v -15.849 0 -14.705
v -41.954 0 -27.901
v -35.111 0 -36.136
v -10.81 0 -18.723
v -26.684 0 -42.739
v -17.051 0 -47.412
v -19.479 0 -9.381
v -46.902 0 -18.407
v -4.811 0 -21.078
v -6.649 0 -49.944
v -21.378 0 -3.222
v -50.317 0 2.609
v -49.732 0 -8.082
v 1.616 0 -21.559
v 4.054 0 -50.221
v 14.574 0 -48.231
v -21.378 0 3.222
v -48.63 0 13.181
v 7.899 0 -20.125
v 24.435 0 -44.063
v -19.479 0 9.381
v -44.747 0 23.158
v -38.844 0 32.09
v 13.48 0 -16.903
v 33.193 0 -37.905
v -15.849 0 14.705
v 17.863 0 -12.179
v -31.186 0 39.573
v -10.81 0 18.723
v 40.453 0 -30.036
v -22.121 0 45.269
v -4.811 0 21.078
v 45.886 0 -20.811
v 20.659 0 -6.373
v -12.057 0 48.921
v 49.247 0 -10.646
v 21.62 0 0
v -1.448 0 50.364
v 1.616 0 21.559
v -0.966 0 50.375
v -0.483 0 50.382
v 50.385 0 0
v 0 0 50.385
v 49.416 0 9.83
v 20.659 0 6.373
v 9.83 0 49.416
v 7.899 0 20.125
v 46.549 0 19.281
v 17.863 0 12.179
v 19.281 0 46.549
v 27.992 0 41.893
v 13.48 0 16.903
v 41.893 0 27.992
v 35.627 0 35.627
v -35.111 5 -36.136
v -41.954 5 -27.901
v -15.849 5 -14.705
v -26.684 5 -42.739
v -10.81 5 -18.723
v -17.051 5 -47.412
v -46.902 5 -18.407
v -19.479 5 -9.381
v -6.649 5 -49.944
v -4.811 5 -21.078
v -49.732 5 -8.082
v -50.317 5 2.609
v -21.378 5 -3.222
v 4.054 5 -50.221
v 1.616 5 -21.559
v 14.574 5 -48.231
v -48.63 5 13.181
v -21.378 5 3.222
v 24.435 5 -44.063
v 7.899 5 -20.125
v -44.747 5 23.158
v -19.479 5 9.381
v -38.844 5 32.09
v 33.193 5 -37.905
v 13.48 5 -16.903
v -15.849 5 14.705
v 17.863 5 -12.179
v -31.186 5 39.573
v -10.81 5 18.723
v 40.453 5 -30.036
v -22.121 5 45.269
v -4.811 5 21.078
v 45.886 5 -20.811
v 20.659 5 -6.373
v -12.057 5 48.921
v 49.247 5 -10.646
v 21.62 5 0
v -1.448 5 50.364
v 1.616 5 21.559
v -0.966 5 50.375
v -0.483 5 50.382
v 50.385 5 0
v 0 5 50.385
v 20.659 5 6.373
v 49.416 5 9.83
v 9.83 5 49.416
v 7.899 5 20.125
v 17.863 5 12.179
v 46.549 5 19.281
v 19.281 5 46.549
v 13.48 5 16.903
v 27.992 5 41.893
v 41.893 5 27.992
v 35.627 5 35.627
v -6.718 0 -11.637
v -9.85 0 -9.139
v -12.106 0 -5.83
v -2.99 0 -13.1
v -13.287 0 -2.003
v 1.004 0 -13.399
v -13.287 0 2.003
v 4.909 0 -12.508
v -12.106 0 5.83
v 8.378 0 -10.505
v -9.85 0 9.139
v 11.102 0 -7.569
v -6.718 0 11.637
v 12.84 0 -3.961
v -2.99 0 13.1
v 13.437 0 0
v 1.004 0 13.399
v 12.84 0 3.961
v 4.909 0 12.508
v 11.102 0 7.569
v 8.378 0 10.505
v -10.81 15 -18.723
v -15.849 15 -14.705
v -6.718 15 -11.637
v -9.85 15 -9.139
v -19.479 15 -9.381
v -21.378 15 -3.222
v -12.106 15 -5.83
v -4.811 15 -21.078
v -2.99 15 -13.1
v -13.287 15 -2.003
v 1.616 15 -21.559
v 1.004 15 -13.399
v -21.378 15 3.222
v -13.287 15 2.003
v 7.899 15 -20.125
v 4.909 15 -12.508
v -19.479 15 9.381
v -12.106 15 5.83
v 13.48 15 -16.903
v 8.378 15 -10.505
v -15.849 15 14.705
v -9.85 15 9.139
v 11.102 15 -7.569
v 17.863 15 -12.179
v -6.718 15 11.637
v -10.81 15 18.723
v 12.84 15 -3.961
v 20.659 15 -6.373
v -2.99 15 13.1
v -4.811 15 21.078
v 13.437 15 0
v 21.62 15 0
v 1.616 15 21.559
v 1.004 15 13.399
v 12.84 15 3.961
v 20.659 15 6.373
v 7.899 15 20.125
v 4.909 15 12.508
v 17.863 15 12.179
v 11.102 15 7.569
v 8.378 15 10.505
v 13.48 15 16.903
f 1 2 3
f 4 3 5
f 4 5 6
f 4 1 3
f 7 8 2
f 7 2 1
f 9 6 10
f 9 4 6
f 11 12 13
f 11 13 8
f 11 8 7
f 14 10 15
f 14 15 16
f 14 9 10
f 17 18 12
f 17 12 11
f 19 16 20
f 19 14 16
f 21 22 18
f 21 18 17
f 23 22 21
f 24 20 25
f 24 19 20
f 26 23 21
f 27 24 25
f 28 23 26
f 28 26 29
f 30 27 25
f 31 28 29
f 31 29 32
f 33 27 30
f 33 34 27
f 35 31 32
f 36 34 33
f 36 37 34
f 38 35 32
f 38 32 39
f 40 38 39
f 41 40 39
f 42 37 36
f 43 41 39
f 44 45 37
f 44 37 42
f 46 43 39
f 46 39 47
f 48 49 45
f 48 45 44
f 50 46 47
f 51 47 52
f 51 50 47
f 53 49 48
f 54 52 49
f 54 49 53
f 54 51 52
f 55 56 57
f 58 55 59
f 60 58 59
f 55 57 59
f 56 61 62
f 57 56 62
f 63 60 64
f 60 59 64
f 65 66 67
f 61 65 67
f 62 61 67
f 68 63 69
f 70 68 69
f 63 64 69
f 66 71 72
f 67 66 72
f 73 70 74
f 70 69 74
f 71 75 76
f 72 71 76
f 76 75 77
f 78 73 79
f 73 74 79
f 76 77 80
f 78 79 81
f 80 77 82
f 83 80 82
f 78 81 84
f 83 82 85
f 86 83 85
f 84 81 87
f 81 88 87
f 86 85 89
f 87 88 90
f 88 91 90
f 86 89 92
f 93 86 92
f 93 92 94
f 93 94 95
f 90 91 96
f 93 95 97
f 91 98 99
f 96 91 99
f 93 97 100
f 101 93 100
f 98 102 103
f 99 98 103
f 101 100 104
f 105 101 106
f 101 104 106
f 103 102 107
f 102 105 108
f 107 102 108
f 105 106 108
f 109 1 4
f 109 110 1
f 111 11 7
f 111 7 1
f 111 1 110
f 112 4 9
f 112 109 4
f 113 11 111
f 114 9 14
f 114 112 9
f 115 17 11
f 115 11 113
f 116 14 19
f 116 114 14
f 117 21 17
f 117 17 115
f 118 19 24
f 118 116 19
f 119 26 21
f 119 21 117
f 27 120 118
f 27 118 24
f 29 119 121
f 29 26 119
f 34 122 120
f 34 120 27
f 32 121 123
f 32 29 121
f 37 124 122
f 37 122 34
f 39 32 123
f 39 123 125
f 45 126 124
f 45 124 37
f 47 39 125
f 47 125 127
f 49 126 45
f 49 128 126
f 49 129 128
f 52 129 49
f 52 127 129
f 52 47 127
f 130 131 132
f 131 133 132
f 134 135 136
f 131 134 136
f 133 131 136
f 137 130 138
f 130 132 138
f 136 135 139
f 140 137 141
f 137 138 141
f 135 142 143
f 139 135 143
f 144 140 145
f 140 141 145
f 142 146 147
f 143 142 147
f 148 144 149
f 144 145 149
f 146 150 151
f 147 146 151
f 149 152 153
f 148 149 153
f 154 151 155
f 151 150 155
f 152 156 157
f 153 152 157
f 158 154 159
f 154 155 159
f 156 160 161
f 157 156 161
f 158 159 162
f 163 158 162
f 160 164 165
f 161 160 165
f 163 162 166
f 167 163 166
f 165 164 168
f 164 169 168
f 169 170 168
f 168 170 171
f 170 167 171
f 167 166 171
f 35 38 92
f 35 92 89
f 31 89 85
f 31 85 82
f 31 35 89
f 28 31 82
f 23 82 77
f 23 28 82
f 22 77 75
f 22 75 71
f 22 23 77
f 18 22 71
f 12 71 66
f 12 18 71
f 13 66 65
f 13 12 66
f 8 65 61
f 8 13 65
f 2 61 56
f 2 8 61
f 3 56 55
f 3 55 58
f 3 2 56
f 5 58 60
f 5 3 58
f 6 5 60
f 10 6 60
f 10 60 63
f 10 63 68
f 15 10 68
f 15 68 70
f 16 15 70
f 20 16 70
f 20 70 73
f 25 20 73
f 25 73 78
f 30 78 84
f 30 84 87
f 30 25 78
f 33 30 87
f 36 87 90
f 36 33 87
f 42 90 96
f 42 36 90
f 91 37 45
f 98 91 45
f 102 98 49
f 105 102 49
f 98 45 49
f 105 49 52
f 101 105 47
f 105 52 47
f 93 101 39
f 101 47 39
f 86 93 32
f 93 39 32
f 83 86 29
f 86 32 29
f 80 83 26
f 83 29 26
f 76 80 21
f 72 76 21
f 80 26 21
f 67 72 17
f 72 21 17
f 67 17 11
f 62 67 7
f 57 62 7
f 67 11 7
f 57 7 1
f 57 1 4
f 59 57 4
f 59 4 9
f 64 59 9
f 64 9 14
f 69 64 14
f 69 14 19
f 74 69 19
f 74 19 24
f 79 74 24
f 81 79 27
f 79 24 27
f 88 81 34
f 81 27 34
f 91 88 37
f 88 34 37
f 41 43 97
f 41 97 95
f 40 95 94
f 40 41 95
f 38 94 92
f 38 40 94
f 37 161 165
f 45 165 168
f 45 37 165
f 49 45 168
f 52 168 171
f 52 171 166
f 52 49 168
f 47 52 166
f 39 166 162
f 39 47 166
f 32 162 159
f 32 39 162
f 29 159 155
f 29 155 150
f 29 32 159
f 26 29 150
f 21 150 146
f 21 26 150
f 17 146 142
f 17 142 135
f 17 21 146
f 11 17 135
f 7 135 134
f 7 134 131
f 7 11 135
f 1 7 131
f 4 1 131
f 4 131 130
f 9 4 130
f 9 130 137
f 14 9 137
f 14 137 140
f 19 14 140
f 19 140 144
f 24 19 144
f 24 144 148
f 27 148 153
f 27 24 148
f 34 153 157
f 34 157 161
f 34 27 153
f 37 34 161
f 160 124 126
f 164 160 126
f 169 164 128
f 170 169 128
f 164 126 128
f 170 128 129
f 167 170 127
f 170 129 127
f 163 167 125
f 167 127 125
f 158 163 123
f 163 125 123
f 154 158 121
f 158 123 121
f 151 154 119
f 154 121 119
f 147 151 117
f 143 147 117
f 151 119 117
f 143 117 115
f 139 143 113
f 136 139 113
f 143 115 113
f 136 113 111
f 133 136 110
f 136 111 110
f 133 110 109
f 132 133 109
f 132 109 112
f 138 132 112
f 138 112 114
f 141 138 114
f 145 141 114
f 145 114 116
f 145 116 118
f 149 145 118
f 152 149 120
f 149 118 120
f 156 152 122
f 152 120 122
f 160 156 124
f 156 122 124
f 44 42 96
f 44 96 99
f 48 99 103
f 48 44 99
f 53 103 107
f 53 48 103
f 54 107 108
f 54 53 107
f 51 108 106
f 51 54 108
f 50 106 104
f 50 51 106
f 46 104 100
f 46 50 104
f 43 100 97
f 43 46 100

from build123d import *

# Parameters (mm, degrees)
F0_R     = 21.619902501
F0_R_2   = 13.4368376744
F1_DEPTH = 15
F2_DEPTH = 5


# Not quite as in the source:
# - the program builds the solid bodies; features that only make, move or delete a surface that nothing else refers to are left out


with BuildPart() as f1:
    # F0 (on Front) → F1 (new body)
    with BuildSketch(Plane.XZ):
        Circle(F0_R)
        Circle(F0_R_2, mode=Mode.SUBTRACT)
    extrude(amount=-F1_DEPTH)


with BuildPart() as f2:
    # F0 (on Front) → F2 (new body)
    with BuildSketch(Plane.XZ):
        with BuildLine():
            ThreePointArc((-1.4483617852, 50.3637455404), (-35.1114620527, -36.1357143176), (50.3845672475, 0))
            ThreePointArc((50.3845672475, 0), (35.6272691679, 35.6272691679), (0, 50.3845672475))
            Line((0, 50.3845672475), (-1.4483617852, 50.3637455404))
        make_face()
        Circle(F0_R, mode=Mode.SUBTRACT)
        with BuildLine():
            Line((-1.4483617852, 50.3637455404), (0, 50.3845672475))
            ThreePointArc((0, 50.3845672475), (-0.7242557221, 50.3793615518), (-1.4483617852, 50.3637455404))
        make_face()
    extrude(amount=-F2_DEPTH)


solid = Compound([f1.part, f2.part])
